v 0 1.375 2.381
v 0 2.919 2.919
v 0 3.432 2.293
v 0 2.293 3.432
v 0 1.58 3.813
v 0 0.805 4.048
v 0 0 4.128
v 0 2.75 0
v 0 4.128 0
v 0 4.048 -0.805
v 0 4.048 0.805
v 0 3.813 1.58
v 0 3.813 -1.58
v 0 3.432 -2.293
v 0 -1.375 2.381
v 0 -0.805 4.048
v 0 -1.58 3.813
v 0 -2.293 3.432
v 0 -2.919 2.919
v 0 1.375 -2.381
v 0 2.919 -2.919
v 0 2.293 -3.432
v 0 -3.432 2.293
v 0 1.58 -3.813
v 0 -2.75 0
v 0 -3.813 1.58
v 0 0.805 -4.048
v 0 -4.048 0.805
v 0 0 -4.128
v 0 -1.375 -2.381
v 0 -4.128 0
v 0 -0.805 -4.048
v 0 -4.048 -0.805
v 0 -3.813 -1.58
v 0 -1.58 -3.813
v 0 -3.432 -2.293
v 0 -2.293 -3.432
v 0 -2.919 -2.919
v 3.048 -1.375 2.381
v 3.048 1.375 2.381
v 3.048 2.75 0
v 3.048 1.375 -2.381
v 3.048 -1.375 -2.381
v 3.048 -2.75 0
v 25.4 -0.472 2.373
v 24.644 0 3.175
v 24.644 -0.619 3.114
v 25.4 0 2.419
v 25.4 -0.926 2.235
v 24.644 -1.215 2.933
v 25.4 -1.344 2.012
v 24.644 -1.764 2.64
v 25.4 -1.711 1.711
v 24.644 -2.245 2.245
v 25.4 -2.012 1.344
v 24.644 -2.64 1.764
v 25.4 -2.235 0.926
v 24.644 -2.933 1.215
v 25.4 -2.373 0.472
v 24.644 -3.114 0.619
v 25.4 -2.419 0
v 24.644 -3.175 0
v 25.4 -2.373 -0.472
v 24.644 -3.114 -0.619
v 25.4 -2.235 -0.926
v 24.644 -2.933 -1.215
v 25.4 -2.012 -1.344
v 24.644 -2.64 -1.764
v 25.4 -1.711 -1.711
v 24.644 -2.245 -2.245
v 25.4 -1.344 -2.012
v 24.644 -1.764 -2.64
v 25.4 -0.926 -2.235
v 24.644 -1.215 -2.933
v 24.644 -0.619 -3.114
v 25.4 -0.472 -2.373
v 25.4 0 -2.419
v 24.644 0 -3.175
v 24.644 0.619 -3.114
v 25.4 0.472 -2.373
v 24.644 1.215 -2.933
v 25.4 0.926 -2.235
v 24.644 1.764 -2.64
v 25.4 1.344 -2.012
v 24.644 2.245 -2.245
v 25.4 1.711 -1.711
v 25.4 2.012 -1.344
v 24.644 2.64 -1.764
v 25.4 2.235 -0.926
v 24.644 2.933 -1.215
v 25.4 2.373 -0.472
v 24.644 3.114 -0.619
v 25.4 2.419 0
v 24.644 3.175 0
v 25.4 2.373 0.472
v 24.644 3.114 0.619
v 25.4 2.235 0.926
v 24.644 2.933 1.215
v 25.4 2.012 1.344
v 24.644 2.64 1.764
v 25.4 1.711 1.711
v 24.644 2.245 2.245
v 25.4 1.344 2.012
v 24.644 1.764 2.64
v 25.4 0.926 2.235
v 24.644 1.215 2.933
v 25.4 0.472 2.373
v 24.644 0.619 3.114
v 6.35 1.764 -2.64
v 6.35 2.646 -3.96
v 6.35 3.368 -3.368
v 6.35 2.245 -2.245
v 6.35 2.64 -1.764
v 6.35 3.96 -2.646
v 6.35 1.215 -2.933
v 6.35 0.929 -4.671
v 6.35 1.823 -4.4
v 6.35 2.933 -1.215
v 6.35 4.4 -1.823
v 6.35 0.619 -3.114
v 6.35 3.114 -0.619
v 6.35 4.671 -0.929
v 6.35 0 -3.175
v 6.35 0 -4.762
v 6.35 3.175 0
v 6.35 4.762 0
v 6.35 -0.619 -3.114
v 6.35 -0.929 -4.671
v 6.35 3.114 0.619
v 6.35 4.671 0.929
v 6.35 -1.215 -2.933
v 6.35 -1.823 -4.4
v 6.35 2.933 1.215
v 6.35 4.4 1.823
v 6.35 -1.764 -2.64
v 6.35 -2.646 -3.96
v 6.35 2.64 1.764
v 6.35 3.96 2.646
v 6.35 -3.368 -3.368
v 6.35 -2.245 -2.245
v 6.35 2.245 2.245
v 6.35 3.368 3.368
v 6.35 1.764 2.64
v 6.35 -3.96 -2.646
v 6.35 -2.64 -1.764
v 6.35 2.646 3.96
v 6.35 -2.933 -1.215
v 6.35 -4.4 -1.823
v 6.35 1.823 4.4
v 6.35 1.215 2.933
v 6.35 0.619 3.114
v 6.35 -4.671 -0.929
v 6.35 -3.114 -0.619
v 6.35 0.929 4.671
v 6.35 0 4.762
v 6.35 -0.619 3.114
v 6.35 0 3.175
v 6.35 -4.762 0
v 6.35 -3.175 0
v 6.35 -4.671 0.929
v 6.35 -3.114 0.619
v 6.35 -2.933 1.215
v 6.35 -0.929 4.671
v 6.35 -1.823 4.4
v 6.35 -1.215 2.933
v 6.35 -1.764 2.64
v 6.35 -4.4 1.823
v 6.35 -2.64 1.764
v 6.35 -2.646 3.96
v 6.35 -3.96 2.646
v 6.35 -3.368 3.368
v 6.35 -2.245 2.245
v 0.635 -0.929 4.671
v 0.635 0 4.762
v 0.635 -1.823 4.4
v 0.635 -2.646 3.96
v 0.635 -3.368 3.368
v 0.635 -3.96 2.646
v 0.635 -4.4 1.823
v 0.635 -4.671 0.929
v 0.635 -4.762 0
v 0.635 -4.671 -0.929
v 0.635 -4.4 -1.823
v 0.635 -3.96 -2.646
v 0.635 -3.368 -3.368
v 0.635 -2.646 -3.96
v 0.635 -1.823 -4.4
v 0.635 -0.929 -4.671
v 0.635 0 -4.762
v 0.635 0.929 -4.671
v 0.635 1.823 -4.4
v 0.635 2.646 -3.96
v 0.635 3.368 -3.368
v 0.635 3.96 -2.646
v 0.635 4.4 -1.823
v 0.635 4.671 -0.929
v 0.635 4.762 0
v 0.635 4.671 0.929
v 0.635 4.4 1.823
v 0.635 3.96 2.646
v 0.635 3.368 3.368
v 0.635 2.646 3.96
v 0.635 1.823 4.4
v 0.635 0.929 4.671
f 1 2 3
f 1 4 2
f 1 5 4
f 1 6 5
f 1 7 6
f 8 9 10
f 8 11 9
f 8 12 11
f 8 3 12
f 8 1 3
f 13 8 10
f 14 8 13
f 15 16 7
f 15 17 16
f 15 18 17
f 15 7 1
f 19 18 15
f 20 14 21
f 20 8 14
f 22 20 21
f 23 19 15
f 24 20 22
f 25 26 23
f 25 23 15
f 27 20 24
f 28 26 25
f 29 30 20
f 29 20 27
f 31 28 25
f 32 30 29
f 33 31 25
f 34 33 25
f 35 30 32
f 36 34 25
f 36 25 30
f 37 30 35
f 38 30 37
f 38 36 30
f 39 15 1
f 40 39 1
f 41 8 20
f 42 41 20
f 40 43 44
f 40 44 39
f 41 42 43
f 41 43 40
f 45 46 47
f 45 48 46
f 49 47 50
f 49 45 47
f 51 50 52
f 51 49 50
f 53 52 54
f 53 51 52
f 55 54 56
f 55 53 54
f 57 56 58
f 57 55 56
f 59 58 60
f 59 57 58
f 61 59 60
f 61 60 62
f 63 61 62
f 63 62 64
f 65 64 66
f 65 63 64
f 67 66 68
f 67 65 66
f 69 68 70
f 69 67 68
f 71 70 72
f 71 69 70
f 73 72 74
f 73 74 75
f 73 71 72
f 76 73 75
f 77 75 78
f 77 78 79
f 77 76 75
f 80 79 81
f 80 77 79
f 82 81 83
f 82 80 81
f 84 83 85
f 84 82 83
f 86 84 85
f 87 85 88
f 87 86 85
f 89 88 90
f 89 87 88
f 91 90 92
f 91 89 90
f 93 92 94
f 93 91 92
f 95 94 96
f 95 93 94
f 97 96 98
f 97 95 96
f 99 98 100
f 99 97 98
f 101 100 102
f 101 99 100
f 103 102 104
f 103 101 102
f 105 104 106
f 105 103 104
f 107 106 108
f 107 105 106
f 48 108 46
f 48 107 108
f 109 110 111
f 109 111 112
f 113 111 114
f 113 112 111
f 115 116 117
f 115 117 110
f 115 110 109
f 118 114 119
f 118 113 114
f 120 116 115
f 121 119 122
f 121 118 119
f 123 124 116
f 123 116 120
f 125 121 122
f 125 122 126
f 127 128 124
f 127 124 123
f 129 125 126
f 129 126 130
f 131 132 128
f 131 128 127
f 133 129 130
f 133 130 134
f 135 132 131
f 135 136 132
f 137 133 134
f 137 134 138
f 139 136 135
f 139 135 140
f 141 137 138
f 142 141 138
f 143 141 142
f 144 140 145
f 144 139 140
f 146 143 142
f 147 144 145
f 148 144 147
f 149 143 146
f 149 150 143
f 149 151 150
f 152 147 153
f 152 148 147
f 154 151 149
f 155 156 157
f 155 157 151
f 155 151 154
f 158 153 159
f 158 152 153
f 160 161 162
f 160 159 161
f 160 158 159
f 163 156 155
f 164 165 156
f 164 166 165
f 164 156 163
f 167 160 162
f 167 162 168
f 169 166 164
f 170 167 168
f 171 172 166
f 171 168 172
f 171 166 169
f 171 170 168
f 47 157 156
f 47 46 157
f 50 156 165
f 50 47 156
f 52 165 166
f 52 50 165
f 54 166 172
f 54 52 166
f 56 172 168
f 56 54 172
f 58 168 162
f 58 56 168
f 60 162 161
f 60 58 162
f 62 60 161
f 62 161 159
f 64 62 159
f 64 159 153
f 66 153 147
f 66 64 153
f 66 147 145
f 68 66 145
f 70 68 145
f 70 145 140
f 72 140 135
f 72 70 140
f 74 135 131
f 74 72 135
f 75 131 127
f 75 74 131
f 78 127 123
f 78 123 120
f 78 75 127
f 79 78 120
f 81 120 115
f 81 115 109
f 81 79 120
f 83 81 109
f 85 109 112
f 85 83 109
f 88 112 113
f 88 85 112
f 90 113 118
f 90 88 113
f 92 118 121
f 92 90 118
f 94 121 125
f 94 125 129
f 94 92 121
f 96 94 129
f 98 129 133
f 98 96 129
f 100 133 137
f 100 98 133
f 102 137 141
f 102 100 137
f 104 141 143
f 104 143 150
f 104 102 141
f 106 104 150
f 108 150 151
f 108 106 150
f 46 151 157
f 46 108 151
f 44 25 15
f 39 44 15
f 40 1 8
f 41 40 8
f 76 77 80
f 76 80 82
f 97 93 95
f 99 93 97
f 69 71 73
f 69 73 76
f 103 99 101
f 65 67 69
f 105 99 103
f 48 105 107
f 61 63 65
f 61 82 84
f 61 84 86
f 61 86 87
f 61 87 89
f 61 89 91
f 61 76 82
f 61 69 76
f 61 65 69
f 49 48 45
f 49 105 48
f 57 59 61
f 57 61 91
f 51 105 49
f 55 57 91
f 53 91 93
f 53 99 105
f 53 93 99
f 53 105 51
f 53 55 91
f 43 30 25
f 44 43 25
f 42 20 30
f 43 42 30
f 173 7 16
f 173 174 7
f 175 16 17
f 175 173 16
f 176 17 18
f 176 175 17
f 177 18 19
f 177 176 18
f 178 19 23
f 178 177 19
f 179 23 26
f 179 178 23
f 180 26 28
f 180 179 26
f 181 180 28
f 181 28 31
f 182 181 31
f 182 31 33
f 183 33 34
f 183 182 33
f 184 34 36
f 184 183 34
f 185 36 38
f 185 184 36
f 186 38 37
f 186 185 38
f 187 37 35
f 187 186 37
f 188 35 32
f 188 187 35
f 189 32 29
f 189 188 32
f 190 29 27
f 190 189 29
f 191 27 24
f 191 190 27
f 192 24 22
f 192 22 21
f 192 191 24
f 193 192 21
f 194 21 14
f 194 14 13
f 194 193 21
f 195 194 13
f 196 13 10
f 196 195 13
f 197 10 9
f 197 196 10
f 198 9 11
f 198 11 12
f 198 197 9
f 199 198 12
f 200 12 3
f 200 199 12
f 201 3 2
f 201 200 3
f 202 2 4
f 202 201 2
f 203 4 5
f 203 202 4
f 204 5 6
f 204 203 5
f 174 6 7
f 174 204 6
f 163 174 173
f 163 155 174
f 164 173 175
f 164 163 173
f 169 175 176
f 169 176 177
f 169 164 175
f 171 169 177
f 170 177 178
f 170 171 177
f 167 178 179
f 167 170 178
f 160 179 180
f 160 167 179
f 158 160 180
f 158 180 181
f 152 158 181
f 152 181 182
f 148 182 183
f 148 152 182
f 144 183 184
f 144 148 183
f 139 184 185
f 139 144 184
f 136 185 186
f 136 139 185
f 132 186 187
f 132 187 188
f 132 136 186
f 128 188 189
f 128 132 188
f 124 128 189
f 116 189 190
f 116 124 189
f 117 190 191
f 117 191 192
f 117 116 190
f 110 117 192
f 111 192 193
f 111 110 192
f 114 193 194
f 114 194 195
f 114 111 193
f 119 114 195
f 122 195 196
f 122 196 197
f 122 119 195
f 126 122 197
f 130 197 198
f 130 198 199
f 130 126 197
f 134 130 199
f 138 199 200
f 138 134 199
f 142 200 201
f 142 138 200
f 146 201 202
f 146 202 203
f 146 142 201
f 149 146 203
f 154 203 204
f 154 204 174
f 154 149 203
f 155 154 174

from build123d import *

# Parameters (mm, degrees)
HEX_2_DEPTH = 3.048


with BuildPart() as part:
    # BodySke → Base-Revolve (revolve)
    with BuildSketch(Plane.XY, mode=Mode.PRIVATE) as base_revolve_sk:
        Polygon((0, 0), (0, 4.1275), (0.635, 4.7625), (6.35, 4.7625), (6.35, 3.175), (24.64435, 3.175), (25.4, 2.41935), (25.4, 0), align=None)
    revolve(base_revolve_sk.sketch.rotate(Axis((-31.75, 0, 0), (1, 0, 0)), 90), axis=Axis((-31.75, 0, 0), (1, 0, 0)))

    # Sketch3 → Hex 2 (cut)
    with BuildSketch(Plane(origin=(0, 0, 0), x_dir=(0, 0.500000000000001, 0.866025403784438), z_dir=(-1, 0, 0))):
        Polygon((1.374815329, 2.38125), (-1.374815329, 2.38125), (-2.749630657, 0), (-1.374815329, -2.38125), (1.374815329, -2.38125), (2.749630657, 0), align=None)
    extrude(amount=-HEX_2_DEPTH, mode=Mode.SUBTRACT)


solid = part.part
